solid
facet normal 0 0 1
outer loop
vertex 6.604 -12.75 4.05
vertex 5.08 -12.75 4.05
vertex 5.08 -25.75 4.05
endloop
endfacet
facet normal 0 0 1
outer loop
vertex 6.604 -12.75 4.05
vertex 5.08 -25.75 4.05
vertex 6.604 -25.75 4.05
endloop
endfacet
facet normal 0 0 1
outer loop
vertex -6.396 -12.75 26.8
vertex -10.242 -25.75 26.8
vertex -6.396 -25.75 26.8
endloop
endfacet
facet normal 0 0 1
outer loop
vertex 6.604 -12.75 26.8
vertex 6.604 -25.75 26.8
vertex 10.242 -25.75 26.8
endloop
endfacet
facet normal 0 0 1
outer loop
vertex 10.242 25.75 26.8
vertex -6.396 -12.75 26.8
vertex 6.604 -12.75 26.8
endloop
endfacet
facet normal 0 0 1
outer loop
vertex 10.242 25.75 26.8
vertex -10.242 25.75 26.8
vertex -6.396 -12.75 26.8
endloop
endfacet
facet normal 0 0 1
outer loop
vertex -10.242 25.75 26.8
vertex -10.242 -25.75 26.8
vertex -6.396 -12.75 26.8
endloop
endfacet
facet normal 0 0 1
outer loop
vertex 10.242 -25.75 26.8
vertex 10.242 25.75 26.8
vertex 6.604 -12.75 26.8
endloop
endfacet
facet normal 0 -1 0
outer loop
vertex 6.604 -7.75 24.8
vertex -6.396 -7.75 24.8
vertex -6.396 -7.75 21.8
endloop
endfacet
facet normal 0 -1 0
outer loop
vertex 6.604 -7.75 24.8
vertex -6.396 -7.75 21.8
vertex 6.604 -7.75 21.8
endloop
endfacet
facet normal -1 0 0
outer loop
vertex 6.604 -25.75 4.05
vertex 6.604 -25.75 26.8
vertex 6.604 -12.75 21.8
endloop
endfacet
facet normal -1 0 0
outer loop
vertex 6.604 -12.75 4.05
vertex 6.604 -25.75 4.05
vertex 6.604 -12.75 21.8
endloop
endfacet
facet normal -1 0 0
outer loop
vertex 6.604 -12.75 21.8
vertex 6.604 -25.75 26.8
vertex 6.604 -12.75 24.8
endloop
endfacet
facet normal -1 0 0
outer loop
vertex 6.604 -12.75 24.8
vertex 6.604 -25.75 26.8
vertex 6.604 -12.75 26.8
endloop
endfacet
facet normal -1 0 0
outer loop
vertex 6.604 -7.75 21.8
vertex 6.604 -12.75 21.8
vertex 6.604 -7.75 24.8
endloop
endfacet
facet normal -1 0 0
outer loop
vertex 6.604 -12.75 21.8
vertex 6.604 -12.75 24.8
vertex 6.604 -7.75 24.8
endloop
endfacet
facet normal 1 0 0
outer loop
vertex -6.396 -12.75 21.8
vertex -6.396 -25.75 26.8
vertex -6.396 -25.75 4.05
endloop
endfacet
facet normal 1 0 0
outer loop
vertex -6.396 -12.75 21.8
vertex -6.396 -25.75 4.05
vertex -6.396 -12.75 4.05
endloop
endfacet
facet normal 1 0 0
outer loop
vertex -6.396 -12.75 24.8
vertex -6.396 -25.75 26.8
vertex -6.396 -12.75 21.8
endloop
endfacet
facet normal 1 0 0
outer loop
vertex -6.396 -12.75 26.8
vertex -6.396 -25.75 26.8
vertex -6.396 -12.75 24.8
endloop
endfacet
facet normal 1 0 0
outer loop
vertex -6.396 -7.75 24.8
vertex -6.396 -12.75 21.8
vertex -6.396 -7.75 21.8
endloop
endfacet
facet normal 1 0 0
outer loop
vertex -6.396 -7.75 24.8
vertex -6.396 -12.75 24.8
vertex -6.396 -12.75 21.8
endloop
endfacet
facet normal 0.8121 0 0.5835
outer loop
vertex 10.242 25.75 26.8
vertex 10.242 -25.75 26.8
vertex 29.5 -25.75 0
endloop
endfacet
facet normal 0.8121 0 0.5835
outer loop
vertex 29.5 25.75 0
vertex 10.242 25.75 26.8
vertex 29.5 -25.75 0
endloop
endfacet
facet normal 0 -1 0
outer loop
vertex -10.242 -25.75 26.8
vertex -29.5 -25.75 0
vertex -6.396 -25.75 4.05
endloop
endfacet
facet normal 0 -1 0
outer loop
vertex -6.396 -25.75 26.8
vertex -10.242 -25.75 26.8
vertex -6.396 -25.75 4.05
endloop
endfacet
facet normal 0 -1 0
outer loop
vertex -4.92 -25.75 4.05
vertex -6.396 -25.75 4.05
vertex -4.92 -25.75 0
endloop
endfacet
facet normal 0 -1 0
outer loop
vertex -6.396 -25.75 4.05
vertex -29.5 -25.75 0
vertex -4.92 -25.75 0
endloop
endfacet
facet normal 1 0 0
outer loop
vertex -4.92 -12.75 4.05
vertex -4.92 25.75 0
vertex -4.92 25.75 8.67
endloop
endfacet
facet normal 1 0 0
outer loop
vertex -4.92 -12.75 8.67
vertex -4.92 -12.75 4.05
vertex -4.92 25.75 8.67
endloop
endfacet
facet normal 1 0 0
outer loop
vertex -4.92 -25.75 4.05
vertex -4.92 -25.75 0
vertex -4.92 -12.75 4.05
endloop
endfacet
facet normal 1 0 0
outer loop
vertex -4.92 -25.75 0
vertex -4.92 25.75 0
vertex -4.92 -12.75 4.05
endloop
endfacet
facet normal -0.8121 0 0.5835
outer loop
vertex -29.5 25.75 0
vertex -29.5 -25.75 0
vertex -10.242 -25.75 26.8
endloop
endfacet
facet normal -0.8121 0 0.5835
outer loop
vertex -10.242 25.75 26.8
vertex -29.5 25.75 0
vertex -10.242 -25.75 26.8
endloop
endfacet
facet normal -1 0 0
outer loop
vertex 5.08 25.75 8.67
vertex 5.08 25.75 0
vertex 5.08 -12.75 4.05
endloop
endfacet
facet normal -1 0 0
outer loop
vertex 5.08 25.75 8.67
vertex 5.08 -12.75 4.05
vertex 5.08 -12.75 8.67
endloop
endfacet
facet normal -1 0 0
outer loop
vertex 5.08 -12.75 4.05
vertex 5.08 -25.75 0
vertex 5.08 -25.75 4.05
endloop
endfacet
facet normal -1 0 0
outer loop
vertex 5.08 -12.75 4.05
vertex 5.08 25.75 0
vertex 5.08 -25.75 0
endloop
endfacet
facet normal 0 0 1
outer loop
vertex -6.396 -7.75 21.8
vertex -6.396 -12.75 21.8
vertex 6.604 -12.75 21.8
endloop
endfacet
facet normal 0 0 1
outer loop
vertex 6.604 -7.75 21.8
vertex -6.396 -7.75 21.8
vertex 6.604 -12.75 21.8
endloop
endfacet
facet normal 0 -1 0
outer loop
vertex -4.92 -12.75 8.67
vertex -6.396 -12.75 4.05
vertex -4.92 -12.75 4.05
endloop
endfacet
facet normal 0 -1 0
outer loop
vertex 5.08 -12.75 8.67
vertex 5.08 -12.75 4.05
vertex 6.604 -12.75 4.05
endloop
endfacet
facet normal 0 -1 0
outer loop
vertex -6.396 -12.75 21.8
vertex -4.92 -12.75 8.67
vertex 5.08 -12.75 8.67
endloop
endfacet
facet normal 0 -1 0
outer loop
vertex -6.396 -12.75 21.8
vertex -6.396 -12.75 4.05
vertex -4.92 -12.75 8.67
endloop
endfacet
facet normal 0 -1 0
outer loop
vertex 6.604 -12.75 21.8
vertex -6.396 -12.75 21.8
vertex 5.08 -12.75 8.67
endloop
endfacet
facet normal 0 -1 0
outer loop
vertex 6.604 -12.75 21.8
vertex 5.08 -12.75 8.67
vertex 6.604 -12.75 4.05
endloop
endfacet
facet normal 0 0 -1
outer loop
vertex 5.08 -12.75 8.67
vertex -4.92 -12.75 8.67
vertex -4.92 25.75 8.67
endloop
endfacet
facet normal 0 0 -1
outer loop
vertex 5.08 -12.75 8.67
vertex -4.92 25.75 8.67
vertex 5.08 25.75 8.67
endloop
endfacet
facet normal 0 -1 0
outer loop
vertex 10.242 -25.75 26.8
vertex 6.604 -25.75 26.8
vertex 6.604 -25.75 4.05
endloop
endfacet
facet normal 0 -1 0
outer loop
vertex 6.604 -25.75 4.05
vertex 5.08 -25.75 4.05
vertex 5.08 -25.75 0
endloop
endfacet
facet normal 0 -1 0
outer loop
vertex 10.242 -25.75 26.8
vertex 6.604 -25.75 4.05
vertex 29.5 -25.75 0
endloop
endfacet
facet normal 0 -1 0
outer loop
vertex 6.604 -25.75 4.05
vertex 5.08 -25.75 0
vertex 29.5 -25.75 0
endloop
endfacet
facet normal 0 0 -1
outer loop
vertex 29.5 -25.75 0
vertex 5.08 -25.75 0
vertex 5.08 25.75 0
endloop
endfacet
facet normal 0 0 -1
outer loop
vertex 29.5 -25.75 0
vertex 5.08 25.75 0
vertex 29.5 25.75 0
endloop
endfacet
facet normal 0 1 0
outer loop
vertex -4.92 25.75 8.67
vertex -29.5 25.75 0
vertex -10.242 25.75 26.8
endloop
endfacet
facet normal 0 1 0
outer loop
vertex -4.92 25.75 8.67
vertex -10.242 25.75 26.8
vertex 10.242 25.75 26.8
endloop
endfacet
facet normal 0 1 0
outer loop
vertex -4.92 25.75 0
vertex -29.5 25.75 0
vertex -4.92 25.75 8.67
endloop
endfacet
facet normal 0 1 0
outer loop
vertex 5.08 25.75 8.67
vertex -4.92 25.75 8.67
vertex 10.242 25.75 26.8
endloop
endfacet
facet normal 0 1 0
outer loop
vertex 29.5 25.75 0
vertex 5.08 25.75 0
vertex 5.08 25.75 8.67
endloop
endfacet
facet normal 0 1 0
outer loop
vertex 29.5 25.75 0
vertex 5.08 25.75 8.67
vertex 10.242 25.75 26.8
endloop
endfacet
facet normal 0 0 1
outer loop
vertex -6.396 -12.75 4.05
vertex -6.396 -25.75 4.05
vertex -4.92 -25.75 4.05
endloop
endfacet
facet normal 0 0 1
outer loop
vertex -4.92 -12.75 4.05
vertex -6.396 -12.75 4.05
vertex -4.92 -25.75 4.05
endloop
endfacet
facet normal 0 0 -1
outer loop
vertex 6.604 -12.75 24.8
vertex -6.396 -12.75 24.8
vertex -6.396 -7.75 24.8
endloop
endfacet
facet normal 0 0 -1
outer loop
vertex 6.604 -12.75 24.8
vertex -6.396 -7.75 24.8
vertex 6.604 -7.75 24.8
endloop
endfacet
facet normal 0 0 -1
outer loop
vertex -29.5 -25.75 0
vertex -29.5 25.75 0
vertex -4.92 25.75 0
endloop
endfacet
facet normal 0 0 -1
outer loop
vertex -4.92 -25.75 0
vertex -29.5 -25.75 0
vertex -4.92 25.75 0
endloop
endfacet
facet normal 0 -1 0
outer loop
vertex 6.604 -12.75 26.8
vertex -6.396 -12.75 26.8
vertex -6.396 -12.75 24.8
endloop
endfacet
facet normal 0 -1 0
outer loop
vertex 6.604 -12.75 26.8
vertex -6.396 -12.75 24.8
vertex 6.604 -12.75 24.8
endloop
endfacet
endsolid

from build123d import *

# Parameters (mm, degrees)
F0_W      = 59
F0_H      = 51.5
F1_DEPTH  = 26.8
F3_DEPTH  = 51.501
F4_W      = 13
F4_H      = 13
F5_DEPTH  = 22.75
F6_W      = 13
F6_H      = 3
F7_DEPTH  = 5
F9_W      = 10
F9_H      = 8.67
F10_DEPTH = 51.501


with BuildPart() as f1:
    # F0 (on Top) → F1 (new body)
    with BuildSketch(Plane.XY):
        Rectangle(F0_W, F0_H)
    extrude(amount=F1_DEPTH)

    # F2 (on face) → F3 (cut, through all)
    with BuildSketch(Plane.XZ.offset(25.75)):
        Polygon((10.242246, 26.8), (29.5, 0), (29.5, 26.8), align=None)
        Polygon((-29.5, 26.8), (-29.5, 0), (-10.242246, 26.8), align=None)
    extrude(amount=-F3_DEPTH, mode=Mode.SUBTRACT)

    # F4 (on face) → F5 (cut)
    with BuildSketch(Plane.XY.offset(26.8)):
        with Locations((0.104, -19.25)):
            Rectangle(F4_W, F4_H)
    extrude(amount=-F5_DEPTH, mode=Mode.SUBTRACT)

    # F6 (on face) → F7 (cut)
    with BuildSketch(Plane.XZ.offset(12.75)):
        with Locations((0.104, 23.3)):
            Rectangle(F6_W, F6_H)
    extrude(amount=-F7_DEPTH, mode=Mode.SUBTRACT)

    # F9 (on face) → F10 (cut, through all)
    with BuildSketch(Plane.XZ.offset(25.75)):
        with Locations((0.08, 4.335)):
            Rectangle(F9_W, F9_H)
    extrude(amount=-F10_DEPTH, mode=Mode.SUBTRACT)


solid = f1.part
